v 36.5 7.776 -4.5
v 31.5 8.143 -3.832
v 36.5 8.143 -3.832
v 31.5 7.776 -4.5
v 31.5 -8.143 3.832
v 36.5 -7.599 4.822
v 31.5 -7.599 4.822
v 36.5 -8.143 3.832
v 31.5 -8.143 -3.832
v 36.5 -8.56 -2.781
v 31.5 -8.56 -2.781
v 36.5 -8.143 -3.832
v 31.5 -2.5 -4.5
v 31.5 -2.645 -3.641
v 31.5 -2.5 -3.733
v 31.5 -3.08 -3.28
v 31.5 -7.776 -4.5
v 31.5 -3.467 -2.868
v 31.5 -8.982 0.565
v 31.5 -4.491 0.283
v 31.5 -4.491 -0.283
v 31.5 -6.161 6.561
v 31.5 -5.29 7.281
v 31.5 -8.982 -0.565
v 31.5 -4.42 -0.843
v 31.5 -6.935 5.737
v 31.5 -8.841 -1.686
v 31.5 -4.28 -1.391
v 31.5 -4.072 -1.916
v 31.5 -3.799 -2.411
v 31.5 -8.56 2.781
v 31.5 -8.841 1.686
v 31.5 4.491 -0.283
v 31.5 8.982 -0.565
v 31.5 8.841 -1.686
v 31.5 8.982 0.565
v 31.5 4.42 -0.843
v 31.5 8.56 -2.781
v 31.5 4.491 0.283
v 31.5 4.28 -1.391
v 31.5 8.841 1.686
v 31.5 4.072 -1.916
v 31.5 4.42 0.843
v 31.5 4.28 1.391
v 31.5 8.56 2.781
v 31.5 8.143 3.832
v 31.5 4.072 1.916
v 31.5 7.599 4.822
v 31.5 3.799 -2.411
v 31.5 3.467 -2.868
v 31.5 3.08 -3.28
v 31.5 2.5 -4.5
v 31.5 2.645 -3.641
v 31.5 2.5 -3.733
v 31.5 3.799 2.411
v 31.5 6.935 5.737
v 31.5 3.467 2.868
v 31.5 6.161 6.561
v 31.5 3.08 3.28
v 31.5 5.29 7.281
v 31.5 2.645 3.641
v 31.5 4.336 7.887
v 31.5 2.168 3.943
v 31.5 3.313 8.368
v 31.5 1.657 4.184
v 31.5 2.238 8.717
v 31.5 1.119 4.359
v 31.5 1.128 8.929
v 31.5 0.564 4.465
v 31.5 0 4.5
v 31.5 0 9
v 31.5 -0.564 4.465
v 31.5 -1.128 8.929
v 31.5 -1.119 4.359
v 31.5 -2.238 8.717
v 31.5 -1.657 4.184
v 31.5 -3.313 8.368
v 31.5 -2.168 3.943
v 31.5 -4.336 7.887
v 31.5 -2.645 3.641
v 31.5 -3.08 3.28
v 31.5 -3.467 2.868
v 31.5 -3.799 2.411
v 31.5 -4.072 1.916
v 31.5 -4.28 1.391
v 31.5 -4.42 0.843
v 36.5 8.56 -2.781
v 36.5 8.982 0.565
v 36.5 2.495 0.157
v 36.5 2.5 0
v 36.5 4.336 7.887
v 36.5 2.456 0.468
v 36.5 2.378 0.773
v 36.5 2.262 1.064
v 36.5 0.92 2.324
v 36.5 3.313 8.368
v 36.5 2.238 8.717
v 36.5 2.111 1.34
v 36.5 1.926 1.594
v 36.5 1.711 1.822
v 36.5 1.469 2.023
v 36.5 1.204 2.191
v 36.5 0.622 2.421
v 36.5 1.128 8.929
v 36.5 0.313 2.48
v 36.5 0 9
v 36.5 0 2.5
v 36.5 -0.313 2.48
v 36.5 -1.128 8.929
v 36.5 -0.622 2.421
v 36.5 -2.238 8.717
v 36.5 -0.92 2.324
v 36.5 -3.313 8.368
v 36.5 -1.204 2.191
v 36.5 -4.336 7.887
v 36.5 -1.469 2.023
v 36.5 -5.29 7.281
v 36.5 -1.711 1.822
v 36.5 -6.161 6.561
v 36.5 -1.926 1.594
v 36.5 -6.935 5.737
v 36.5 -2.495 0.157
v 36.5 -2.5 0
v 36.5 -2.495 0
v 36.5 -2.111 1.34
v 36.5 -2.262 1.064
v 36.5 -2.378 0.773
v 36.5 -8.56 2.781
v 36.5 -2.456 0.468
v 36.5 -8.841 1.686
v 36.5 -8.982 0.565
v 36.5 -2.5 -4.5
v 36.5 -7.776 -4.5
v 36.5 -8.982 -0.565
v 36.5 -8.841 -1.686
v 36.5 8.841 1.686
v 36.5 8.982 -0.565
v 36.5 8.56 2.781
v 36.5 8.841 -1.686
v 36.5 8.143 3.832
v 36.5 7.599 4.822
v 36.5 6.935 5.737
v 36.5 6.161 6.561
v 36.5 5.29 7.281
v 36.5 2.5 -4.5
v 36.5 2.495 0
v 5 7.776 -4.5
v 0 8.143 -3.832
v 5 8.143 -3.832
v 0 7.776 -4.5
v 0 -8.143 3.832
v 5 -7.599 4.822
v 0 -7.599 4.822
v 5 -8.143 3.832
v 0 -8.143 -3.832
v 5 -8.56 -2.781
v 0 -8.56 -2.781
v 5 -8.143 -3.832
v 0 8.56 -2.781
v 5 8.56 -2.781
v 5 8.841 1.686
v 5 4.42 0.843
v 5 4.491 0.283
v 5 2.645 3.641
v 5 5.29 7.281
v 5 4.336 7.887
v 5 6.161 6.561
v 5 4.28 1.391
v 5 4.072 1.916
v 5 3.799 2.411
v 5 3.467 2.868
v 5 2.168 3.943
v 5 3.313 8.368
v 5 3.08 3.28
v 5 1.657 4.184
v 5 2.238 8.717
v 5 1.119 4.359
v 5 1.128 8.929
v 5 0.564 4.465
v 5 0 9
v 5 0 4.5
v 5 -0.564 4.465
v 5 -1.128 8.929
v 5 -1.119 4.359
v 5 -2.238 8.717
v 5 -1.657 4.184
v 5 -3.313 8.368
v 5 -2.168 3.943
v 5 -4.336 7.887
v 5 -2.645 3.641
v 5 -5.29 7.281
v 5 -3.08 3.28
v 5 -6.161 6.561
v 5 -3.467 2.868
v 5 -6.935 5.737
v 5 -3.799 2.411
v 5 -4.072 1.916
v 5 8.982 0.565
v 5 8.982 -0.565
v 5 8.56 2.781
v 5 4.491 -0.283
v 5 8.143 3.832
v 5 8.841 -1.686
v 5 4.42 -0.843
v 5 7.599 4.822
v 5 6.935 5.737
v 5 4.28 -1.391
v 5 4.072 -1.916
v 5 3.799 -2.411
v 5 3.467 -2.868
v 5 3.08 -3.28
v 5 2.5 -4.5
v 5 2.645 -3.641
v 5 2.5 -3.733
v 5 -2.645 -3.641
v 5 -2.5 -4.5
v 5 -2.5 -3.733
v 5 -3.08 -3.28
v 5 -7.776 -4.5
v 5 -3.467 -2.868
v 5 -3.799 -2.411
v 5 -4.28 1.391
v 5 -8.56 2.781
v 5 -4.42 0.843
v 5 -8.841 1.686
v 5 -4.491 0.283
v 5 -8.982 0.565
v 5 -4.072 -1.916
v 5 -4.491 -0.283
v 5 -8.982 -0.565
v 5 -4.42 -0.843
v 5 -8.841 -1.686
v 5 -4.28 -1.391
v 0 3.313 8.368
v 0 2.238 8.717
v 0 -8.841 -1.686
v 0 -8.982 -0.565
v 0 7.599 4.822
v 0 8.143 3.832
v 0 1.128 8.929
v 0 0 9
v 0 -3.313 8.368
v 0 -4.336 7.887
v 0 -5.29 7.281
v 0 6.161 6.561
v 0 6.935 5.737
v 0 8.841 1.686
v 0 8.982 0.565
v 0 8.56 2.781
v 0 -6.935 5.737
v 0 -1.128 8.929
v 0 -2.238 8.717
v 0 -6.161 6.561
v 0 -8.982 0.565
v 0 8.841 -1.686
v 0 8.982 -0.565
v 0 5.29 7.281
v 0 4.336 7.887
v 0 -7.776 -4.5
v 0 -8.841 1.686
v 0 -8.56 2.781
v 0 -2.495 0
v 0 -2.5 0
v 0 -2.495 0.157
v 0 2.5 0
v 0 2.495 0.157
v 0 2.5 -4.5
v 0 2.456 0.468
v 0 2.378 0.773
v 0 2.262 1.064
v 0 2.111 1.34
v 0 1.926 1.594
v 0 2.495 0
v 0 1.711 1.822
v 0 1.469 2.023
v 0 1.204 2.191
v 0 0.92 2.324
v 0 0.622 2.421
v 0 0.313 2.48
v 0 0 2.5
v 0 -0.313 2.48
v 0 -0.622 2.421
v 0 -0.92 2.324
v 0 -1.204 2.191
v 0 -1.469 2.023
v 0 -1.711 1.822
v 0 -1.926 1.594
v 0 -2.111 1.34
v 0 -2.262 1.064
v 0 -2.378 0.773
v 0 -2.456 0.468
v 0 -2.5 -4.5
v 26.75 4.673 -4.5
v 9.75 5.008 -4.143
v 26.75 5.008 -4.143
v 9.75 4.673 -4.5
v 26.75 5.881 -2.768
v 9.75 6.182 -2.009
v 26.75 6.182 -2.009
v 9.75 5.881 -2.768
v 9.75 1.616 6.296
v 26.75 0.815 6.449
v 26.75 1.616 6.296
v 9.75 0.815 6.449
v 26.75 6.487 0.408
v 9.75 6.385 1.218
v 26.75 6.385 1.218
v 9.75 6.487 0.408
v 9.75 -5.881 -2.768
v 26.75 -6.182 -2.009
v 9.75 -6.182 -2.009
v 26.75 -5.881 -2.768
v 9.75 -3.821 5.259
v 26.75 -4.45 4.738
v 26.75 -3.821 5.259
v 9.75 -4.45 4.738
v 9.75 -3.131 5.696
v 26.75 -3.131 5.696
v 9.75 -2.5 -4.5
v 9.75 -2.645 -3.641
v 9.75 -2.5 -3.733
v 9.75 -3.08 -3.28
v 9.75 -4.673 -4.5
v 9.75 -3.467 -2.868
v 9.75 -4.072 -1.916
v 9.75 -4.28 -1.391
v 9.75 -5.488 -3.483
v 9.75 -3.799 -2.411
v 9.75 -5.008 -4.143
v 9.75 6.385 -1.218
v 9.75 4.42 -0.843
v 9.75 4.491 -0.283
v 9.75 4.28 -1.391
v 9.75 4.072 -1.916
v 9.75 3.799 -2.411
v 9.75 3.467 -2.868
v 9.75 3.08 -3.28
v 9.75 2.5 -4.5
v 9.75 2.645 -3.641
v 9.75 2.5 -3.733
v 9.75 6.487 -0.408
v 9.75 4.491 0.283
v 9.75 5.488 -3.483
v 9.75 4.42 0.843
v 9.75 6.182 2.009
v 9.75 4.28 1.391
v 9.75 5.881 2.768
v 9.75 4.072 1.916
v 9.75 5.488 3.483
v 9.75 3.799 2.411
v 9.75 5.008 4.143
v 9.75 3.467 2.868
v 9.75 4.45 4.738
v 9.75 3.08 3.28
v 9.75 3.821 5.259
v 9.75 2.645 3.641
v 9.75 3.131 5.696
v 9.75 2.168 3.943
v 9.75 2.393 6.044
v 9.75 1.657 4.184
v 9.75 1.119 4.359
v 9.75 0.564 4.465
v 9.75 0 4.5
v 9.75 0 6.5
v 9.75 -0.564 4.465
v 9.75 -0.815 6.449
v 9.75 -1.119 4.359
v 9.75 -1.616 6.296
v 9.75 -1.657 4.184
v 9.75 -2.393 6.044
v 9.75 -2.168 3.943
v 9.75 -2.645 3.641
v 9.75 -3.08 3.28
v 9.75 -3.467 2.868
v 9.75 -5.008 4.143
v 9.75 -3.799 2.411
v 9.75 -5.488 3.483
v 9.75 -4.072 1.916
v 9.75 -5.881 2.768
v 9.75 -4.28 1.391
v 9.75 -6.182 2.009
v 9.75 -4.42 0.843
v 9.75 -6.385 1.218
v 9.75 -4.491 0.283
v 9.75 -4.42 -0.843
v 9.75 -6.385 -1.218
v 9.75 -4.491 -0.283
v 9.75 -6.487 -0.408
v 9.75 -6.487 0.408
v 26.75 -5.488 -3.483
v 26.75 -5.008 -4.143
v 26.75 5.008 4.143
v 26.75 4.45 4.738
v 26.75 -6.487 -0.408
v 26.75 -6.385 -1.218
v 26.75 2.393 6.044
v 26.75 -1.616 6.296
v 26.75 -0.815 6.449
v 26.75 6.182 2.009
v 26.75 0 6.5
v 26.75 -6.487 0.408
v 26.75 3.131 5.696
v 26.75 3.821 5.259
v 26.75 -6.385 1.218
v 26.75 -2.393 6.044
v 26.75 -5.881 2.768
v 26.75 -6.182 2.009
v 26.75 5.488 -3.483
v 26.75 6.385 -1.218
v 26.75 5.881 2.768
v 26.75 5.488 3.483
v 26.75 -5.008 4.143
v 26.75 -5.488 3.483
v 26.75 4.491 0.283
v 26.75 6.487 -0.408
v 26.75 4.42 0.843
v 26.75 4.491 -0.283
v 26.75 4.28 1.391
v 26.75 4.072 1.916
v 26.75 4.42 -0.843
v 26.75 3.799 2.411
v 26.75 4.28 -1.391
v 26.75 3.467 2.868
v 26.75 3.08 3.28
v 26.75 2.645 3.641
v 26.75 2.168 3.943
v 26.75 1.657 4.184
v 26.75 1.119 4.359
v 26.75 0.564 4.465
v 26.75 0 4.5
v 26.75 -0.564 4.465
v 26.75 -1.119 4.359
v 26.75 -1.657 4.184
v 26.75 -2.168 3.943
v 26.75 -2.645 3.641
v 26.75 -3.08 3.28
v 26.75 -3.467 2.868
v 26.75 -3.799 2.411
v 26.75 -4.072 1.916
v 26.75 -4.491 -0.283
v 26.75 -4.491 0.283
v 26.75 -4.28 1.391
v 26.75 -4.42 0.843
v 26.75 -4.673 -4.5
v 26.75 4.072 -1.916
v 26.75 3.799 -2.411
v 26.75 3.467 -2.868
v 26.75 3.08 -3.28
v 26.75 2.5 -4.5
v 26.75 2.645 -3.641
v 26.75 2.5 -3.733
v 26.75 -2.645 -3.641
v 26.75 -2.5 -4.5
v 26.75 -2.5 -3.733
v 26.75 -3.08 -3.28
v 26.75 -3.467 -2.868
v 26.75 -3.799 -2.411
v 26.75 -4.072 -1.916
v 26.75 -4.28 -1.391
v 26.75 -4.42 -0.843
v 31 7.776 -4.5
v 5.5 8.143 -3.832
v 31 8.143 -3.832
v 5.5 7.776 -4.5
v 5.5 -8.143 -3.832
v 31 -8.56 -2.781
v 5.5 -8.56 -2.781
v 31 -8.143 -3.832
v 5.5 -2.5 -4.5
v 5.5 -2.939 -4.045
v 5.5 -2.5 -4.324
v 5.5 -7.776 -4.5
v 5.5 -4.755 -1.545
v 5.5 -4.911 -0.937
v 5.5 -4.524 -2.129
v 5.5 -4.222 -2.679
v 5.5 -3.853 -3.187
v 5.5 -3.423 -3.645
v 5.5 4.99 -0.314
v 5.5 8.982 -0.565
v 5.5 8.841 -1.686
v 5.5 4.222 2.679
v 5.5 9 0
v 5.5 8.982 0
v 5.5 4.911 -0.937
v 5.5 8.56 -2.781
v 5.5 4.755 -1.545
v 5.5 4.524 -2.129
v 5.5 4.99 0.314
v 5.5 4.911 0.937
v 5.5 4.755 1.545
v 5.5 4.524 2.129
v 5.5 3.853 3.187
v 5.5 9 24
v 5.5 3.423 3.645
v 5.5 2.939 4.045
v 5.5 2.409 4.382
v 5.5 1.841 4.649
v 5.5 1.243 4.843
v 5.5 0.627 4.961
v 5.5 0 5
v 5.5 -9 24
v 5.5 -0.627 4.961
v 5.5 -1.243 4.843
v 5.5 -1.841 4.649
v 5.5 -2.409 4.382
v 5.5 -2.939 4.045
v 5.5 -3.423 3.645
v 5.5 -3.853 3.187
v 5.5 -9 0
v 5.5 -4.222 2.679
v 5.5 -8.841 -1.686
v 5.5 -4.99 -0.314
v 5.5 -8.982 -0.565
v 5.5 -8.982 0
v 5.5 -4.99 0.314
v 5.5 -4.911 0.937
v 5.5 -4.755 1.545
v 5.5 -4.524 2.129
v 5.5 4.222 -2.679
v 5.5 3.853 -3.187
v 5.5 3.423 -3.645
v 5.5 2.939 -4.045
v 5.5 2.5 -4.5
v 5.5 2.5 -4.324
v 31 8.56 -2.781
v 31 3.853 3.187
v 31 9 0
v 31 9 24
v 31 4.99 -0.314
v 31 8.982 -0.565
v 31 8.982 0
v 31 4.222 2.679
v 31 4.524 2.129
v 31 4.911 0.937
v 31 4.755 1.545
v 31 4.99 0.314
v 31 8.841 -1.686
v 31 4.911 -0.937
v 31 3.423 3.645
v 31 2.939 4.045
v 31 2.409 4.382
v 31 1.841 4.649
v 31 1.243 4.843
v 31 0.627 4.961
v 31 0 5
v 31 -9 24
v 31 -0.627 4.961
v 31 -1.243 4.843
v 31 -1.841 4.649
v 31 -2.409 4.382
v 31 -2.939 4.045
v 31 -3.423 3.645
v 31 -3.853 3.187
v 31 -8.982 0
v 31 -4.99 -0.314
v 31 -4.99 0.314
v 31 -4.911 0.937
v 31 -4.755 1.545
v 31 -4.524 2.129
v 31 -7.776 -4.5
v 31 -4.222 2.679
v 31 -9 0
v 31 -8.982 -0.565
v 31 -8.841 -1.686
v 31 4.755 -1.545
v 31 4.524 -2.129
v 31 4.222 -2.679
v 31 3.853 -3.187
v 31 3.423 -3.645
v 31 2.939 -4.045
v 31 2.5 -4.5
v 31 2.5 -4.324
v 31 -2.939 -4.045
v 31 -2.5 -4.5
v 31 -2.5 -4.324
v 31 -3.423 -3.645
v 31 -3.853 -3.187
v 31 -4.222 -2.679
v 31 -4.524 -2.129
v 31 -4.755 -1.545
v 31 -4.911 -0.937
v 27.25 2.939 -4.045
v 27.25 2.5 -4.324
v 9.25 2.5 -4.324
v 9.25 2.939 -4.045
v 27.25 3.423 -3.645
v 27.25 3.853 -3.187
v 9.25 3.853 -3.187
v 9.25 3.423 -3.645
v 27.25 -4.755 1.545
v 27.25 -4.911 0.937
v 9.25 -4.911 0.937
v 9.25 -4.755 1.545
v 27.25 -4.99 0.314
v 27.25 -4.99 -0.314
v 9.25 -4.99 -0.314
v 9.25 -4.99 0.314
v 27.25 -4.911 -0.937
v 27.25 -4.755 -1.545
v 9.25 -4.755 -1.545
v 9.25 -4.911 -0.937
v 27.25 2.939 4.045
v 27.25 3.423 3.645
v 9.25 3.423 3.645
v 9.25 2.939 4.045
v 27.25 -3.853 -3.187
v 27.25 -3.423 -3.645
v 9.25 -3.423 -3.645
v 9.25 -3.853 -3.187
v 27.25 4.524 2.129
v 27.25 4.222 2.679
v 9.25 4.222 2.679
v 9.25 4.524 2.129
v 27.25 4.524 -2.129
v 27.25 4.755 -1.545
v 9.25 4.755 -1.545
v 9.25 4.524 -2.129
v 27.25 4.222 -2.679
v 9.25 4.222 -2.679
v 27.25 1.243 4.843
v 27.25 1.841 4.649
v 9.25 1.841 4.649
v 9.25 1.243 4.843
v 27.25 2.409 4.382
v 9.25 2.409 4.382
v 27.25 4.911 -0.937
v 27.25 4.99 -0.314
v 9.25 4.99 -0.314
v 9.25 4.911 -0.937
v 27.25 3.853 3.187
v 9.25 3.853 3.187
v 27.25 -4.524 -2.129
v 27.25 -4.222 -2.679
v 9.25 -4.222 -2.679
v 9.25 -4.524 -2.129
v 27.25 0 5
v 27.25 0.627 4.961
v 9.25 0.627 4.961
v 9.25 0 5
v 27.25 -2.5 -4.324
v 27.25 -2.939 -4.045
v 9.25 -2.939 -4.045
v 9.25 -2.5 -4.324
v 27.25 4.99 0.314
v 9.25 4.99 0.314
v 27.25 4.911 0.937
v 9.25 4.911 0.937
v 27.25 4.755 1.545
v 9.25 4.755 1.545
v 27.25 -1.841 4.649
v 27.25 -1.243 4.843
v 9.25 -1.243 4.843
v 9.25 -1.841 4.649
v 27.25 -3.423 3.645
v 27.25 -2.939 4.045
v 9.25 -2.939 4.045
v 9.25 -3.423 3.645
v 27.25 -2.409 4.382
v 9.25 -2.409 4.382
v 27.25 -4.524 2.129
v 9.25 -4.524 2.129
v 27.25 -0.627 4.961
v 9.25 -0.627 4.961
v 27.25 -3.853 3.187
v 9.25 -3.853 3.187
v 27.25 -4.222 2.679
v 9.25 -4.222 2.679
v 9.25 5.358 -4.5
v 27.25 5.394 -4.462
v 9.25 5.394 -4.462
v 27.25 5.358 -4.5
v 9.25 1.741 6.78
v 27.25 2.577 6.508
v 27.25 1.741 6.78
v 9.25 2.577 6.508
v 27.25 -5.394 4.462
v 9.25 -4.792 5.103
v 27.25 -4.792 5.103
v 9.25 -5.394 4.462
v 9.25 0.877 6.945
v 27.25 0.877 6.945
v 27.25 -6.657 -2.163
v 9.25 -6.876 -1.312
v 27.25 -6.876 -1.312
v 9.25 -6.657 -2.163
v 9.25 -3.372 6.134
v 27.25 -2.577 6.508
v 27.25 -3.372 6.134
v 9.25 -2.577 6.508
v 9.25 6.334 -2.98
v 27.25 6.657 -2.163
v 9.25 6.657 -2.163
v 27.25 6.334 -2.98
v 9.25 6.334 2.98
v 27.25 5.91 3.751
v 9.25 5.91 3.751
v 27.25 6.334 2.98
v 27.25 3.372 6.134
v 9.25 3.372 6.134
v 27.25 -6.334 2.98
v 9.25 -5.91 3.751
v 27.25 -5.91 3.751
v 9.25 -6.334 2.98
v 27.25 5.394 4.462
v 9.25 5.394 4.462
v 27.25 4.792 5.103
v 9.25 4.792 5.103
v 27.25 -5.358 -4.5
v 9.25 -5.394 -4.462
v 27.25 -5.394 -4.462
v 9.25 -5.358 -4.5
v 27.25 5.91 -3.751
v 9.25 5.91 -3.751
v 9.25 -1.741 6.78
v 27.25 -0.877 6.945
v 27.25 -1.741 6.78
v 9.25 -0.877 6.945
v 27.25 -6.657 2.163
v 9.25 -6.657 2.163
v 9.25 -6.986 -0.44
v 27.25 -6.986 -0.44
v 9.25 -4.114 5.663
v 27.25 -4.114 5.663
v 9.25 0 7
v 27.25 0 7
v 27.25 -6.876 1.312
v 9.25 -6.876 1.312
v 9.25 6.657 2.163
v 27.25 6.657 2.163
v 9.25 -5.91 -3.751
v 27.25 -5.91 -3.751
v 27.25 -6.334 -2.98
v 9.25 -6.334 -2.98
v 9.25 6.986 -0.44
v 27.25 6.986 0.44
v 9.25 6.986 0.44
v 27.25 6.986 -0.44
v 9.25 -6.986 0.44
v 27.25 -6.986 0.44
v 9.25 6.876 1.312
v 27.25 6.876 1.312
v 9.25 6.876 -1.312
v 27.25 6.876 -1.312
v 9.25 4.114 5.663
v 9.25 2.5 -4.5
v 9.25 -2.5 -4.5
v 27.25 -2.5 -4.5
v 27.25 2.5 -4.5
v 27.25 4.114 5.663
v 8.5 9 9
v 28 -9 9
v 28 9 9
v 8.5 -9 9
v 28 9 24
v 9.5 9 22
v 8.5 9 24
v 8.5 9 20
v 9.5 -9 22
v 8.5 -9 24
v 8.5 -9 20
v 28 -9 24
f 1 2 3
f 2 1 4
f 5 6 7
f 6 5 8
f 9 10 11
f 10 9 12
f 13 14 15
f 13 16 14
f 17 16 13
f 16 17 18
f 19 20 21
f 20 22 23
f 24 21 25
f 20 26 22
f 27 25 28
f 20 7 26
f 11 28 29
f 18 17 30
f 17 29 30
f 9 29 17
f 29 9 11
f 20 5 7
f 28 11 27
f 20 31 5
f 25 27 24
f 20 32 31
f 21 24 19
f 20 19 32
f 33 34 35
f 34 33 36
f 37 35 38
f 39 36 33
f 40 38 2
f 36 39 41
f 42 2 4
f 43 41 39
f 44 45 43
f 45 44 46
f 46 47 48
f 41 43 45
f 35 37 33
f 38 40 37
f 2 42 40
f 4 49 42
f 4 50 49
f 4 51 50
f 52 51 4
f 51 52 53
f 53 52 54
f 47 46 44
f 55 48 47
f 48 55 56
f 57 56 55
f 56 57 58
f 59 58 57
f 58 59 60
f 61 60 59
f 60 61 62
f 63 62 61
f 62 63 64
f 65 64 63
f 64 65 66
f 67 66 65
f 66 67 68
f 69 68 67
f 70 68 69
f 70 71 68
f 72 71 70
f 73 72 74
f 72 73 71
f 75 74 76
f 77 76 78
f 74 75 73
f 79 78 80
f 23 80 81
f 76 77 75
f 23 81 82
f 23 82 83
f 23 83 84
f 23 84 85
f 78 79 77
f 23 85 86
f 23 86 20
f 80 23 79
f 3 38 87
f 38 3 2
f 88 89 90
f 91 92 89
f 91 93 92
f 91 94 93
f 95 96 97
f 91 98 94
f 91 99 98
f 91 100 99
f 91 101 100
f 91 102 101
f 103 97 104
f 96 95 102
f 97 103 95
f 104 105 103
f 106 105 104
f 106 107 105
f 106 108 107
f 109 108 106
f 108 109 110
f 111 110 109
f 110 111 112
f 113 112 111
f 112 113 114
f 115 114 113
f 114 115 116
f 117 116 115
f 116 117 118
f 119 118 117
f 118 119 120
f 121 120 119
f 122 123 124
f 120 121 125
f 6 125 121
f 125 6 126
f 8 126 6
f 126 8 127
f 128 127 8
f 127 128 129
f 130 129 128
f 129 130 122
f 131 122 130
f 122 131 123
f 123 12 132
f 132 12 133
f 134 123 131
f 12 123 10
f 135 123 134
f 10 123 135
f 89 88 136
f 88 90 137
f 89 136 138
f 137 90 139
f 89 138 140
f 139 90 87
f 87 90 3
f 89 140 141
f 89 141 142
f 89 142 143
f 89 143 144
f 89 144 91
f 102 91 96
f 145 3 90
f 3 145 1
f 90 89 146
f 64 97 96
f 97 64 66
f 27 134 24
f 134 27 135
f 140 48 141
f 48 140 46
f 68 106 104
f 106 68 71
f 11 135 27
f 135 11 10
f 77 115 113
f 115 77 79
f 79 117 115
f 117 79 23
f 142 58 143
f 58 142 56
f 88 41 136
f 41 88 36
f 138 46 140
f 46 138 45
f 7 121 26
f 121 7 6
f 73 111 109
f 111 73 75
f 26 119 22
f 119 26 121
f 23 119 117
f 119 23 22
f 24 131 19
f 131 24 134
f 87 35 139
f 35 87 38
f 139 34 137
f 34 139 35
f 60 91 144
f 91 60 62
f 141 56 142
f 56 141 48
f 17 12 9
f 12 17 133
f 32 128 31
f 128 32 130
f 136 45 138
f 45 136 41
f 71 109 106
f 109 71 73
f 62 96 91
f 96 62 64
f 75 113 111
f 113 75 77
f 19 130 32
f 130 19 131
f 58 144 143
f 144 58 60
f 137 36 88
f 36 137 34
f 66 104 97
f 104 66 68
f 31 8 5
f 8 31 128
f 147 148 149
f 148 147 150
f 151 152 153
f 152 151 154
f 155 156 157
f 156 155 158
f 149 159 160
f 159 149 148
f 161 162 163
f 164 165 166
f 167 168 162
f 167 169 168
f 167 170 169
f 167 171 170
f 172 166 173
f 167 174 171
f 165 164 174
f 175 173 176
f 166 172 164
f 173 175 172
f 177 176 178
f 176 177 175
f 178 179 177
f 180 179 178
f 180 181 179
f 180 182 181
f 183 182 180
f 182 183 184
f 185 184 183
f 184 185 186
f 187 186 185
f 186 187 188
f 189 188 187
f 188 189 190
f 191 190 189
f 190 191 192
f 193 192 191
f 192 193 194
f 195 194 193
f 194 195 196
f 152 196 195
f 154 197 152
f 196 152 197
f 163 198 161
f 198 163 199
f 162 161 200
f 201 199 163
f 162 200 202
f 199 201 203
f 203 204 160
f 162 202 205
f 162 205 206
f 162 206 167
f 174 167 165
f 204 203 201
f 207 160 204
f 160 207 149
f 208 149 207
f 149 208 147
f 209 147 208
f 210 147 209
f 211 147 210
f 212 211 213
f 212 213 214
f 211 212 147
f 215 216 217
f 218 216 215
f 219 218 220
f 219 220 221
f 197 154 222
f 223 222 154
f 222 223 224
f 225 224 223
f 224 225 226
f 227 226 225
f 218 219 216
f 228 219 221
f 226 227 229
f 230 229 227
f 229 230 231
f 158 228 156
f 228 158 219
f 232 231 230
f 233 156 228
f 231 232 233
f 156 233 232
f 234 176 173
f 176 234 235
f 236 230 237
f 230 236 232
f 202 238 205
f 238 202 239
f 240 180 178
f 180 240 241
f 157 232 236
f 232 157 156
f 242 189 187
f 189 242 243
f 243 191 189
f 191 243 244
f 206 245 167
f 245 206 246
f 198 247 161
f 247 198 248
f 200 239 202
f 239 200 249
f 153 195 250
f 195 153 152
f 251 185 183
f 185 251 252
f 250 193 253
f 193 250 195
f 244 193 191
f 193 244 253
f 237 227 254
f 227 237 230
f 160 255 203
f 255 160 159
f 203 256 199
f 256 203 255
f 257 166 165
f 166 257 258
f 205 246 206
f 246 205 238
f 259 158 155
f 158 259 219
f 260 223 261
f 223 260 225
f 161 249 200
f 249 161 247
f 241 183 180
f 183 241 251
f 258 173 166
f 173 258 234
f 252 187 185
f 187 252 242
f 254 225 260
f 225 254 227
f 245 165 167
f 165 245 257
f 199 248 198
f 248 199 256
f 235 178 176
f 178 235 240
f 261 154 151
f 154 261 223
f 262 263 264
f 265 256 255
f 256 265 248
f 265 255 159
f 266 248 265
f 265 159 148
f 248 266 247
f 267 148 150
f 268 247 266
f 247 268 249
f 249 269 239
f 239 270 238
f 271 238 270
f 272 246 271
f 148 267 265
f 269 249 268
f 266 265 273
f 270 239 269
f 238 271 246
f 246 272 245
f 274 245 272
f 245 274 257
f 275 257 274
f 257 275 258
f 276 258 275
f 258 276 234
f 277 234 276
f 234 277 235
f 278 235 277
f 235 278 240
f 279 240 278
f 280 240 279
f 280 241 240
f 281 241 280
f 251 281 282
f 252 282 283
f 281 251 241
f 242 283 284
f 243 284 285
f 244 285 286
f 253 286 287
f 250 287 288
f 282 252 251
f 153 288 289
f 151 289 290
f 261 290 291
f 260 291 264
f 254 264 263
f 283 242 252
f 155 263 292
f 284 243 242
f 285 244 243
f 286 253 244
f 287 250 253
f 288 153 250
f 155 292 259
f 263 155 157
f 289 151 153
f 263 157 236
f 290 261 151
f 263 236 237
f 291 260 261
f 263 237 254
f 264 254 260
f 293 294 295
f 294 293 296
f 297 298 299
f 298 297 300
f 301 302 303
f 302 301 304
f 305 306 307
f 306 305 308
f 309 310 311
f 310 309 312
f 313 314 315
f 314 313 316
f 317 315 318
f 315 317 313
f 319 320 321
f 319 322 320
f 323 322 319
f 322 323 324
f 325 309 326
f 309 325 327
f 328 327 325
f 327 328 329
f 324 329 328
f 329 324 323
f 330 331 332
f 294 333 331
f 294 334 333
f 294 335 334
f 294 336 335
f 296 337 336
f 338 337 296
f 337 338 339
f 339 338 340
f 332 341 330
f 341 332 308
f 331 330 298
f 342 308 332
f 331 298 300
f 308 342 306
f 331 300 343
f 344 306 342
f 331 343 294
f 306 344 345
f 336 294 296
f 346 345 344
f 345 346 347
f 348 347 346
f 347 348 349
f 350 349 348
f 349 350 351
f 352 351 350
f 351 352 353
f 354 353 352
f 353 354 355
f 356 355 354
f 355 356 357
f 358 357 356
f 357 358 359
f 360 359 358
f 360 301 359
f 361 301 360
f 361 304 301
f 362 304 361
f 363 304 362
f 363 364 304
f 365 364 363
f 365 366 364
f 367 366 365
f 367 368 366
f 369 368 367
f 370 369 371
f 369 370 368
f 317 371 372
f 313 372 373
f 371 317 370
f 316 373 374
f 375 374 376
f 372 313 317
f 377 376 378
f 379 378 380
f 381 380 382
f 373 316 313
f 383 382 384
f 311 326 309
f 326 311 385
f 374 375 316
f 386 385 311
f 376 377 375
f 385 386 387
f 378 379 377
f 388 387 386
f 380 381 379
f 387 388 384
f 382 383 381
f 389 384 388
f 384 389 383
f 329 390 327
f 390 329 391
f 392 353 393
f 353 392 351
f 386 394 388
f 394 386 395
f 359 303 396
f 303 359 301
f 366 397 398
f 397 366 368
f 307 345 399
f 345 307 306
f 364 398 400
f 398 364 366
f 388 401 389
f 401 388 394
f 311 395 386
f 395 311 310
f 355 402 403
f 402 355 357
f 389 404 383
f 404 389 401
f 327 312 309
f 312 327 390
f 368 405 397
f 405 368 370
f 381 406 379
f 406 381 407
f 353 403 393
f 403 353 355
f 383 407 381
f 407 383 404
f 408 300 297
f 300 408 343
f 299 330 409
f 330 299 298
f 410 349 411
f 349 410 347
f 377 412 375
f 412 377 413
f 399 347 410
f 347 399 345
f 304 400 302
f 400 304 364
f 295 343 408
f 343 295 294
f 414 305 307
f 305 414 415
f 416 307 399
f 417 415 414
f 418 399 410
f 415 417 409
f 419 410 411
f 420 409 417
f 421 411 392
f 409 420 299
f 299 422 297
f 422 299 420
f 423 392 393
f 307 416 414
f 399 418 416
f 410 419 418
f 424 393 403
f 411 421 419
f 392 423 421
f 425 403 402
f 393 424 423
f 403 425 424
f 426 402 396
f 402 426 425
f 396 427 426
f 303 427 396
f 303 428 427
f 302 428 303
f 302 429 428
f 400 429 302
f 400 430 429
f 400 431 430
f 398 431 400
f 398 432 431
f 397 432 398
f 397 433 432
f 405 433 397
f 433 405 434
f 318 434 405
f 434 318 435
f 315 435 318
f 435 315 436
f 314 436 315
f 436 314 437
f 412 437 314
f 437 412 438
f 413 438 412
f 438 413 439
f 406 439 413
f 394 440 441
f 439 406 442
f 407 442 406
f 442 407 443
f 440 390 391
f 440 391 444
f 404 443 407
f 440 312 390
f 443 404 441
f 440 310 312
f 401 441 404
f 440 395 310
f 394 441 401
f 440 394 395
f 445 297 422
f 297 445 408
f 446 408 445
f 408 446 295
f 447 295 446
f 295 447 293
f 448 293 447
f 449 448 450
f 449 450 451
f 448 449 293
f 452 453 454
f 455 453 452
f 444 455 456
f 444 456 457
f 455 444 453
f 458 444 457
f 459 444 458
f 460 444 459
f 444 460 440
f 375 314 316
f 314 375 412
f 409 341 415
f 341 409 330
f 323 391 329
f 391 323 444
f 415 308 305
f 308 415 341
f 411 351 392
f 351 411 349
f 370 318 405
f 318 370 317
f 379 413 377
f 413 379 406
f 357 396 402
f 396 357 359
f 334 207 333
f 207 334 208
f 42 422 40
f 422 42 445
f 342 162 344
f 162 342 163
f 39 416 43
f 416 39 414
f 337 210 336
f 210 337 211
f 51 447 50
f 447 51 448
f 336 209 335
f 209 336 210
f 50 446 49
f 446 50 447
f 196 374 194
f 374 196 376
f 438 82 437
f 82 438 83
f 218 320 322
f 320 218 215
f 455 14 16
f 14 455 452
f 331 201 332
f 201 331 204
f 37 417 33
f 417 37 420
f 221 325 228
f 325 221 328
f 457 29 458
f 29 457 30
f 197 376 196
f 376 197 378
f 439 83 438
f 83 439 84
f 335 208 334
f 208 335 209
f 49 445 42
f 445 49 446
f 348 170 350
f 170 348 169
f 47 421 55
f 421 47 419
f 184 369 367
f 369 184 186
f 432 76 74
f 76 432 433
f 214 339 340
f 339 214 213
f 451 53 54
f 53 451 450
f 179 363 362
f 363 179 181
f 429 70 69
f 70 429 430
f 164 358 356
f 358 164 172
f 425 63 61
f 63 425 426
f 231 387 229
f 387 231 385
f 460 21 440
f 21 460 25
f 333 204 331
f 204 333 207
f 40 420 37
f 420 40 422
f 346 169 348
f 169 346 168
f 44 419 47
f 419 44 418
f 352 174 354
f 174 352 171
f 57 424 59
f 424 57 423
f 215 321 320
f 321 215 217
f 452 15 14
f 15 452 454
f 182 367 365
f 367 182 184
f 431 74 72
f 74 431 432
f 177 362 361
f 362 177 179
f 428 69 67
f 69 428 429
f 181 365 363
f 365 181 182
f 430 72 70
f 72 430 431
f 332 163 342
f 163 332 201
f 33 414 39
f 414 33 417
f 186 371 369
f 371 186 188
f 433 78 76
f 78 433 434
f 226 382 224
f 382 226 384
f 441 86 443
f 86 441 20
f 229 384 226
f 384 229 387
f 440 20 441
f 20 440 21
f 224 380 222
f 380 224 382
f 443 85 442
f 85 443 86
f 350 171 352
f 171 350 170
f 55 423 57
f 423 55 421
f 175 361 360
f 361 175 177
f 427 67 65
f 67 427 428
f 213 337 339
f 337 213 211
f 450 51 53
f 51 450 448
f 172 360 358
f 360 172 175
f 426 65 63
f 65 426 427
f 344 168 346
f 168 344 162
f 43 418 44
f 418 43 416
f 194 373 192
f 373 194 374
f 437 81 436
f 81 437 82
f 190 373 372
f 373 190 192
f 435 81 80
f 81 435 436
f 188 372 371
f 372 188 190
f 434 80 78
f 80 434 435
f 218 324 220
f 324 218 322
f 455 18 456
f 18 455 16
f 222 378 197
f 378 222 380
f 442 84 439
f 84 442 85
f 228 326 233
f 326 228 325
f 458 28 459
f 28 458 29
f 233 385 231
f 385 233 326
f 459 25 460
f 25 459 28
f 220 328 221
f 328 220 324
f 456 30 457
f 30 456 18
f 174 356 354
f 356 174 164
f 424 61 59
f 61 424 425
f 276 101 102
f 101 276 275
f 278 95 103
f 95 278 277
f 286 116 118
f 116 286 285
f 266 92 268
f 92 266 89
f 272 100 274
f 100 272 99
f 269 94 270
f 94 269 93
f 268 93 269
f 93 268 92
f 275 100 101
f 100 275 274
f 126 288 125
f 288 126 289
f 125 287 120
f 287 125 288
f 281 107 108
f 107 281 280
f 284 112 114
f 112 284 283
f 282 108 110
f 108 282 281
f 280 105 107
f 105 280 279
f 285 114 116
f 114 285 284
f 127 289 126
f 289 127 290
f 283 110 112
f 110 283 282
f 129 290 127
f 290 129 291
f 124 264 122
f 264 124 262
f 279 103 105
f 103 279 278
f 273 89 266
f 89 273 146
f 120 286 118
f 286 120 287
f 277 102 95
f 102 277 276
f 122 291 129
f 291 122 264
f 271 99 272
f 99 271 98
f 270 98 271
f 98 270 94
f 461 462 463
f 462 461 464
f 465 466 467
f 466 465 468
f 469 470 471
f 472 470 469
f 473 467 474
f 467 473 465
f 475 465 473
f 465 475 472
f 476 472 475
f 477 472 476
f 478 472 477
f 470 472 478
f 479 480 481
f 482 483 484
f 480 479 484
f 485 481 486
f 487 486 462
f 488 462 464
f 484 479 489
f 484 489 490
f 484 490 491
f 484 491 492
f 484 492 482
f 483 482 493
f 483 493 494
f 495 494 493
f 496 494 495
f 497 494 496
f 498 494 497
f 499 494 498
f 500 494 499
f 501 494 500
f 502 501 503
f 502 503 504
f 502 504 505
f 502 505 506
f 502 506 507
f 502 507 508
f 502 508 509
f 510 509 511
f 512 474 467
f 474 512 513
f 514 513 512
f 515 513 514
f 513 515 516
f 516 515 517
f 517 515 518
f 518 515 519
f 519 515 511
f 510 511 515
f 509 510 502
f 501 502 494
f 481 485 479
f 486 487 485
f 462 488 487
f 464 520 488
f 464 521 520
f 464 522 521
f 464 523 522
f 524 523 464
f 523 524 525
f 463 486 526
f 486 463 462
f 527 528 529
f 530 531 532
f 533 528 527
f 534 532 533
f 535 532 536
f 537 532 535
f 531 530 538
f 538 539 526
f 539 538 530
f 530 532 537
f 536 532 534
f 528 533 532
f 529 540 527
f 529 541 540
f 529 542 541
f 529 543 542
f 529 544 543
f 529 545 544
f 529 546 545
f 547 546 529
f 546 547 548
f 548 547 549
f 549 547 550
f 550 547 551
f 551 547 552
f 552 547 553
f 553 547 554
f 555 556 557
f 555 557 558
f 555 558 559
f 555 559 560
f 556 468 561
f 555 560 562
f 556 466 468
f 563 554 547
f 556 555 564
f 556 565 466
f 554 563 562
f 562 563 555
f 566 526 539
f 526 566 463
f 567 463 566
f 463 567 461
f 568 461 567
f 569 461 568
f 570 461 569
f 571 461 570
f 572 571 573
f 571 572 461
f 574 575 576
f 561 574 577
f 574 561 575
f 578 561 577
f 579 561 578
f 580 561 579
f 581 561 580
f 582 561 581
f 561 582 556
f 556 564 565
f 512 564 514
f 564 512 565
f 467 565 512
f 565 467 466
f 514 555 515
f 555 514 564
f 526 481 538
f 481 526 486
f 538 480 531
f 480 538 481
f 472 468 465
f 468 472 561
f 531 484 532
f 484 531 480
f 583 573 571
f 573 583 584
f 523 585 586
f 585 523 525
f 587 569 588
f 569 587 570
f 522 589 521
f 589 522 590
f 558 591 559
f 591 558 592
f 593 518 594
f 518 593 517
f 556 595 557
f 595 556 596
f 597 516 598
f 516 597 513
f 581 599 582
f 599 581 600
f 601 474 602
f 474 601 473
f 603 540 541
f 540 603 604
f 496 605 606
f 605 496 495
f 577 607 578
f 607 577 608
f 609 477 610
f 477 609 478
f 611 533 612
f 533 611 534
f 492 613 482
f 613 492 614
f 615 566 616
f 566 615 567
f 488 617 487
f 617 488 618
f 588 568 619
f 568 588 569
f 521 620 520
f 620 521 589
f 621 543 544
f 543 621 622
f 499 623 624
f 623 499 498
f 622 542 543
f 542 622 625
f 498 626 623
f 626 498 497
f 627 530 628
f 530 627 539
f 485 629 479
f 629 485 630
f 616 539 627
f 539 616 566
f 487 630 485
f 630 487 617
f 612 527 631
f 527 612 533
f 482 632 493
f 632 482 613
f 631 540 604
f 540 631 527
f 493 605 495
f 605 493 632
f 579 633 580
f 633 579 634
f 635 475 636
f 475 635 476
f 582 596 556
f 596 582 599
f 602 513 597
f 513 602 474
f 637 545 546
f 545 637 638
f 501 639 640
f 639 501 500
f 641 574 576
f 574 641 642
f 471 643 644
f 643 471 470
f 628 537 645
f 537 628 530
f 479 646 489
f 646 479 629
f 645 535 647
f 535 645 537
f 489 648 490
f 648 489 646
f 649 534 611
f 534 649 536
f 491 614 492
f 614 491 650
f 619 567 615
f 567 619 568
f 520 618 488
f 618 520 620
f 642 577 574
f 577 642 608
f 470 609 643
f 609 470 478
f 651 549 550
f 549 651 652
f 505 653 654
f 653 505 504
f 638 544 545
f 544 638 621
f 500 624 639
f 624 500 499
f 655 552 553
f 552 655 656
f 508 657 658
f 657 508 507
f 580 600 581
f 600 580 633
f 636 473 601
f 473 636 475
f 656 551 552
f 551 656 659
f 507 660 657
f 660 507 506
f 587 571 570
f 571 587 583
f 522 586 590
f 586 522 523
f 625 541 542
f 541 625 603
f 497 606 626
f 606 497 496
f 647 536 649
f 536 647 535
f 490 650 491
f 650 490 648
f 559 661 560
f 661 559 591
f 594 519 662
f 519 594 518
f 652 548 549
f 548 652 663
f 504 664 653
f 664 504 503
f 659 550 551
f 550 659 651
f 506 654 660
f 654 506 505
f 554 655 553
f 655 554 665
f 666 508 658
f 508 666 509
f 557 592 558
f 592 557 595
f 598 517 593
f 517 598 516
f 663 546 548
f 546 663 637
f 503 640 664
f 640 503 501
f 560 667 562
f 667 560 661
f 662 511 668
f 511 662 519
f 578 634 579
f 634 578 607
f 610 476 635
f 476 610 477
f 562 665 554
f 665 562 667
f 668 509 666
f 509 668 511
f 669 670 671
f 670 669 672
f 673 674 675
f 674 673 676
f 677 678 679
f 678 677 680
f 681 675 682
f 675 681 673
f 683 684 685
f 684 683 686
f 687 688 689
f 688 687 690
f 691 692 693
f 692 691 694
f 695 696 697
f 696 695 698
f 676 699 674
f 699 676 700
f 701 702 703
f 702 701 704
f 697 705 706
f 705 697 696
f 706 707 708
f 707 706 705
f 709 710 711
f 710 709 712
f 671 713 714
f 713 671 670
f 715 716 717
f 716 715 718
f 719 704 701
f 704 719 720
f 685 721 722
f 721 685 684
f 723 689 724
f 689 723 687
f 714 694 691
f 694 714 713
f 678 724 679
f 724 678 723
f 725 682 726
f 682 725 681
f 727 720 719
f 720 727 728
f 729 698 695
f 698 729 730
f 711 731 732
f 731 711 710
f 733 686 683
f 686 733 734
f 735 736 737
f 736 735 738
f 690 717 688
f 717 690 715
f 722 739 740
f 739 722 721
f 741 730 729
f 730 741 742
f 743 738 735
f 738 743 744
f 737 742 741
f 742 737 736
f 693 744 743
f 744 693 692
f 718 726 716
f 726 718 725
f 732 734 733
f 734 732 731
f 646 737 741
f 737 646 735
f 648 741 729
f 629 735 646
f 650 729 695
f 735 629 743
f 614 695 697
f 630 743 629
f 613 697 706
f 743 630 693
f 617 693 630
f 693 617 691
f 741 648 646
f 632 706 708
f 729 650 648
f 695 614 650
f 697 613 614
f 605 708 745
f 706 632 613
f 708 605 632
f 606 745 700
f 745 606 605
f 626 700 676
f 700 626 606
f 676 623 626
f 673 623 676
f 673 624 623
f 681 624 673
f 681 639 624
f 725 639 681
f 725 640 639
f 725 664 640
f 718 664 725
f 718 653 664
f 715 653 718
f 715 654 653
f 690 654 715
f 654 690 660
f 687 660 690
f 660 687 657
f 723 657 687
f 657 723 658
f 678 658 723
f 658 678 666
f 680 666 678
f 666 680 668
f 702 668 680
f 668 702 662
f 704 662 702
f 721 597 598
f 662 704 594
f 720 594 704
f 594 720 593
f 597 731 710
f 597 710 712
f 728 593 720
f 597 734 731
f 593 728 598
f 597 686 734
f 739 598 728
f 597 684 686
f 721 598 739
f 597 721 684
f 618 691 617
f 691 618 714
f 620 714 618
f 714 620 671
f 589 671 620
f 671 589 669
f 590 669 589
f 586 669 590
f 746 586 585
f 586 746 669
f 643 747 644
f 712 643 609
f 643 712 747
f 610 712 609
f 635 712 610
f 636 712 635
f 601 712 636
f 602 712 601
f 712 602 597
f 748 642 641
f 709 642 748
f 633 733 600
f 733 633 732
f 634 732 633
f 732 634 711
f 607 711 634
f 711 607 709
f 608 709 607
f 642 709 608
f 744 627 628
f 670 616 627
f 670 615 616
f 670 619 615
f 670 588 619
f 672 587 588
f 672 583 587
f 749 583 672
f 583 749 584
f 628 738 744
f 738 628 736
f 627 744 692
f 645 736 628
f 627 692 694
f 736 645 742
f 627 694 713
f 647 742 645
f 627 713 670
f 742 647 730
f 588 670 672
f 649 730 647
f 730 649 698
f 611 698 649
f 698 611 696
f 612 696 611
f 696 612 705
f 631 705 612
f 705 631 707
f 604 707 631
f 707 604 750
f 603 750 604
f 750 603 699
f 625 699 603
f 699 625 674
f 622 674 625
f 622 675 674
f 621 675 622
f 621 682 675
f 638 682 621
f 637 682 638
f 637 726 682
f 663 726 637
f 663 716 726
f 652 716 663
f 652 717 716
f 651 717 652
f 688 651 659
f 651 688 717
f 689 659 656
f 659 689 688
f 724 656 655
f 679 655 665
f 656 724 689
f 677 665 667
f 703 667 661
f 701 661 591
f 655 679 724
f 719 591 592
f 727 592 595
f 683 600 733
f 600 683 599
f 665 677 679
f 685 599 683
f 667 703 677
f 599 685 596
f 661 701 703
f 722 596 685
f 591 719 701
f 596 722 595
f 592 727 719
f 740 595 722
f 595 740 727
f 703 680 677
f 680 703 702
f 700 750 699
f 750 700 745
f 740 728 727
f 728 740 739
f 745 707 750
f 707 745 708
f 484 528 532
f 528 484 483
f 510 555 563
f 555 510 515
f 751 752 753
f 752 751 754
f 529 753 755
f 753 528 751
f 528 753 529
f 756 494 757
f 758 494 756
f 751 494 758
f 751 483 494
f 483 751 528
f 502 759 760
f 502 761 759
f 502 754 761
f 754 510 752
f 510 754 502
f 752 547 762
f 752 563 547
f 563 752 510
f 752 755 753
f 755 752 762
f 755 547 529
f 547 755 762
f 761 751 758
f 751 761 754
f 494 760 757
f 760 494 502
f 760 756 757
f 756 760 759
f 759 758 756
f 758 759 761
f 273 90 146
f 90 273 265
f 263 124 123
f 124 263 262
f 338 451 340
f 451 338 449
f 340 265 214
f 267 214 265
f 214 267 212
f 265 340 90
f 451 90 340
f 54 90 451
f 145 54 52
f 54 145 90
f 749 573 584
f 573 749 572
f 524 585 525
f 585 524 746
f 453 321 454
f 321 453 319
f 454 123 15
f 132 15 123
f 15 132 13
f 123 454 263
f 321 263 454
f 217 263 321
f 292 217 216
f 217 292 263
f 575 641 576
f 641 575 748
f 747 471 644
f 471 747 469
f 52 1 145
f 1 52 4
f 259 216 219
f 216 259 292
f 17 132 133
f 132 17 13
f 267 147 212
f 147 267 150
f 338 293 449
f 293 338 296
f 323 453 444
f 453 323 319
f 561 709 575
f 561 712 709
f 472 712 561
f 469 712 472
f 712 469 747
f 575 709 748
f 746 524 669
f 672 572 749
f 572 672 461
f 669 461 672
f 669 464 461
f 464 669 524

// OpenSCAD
// [FL_INDEX: keywords="openscad, 3d_parametric, Captive_Customizeable_Cable_Holder, csg_solid" | COT="Parametric OpenSCAD design from 3DCodeverse"]
// Title: Captive Customizeable Cable Holder

/* [PrintOptions] */
// preview[view:south east, tilt:bottom diagonal]

// splits the cable holder into 2 parts for printing if your machine doesn't do well with printing tight tolerances
show_seperate = "no"; // [yes, no]

/* [Basic] */
// is the diameter of the cable in mm to be held by the cable holder
cable_diameter = 5;
// sets the distance between the holding tabs in mm
table_thickness = 19.5;
// controls the distance between moving parts of the cable holder
tolerance = 0.5;


/* [Table_tabs] */
// adjusts the length of the tabs in mm that will hold the cable holder on to the table
tab_length = 15;
// adjusts how thick the tabs that hold the cable holder to the table should be in mm
tab_thickness = 3;

/* [Table_grip] */
// adjusts the triangular grip protrusion height in mm
grip_height = 1;
// adjusts the base width of the triangular grip protrusion in mm
grip_width = 4;

/* [Thumbwheels] */
//controls how tall the end thumbwheels should be in mm
thumbwheel_height = 5;

/* [Advanced] */
// is confusing name, just play with it and see what it does
retainer_factor = 6; // [3, 4, 5, 6, 7, 8, 9, 10]
// is another one to play around with.  Choose values between 0 and 2
plane_cut_factor = 1;
// is the quality of the cylinders
$fn = 50;

/* [Advanced_neck] */
// is the thickness of the inner rotating cuff in mm
neck_thickness = 2;

/* [Advanced_holder] */
// controls the overall thickness of the outer holder in mm
holder_thickness = 4;

/* [Hidden] */
barrel_lift_factor = 1/retainer_factor;
barrel_thickness = holder_thickness/2;

holder_height = 2*tab_thickness + table_thickness;
holder_diameter = cable_diameter + 2*neck_thickness + 2*tolerance + 2*holder_thickness;
plane_cut_depth = plane_cut_factor*(cable_diameter/2 + neck_thickness);

preview_tab = "";

rotate([0,90,0]) difference()
{

	// main holder barrels and tabs
	union()
	{
		// inner barrel
		
		if(show_seperate == "no")
		{
			InnerBarrel();
		}
		else
		{
			translate([0, holder_diameter + 5, 0]) 
			difference()
			{
				InnerBarrel();
				// cable notch
				translate([0, -cable_diameter/2, -0.5]) cube([holder_diameter/2 + 0.5, cable_diameter, thumbwheel_height + tolerance + holder_height + tolerance + thumbwheel_height + 1]);
				// plane slice
				translate([plane_cut_depth, -(holder_diameter + 1)/2, -0.5]) cube([holder_diameter/2 + 0.5, holder_diameter + 1, thumbwheel_height + tolerance + holder_height + tolerance + thumbwheel_height + 1]);
			}
		}
		
		// outer holder barrel
		highlight("Advanced_holder") difference()
		{
			// main body of the holder
			translate([0,0, thumbwheel_height + tolerance]) cylinder(r = holder_diameter/2, h = holder_height);
			
			// tolerance for neck
			translate([0,0,thumbwheel_height + tolerance + -0.5]) cylinder(r = cable_diameter/2 + neck_thickness + tolerance, h = holder_height + 1);
			// tolerance for the barrel
			translate([0,0, thumbwheel_height + tolerance + barrel_lift_factor*holder_height-tolerance]) cylinder(r = cable_diameter/2 + neck_thickness + barrel_thickness + tolerance, h = holder_height*(1-2*barrel_lift_factor) + 2*tolerance);
		}
		
		// main body holder
		union()
		{
			// upper tab
			highlight("Table_tabs") translate([-tab_length - holder_diameter/2, -holder_diameter/2, thumbwheel_height + tolerance + holder_height - tab_thickness]) cube([tab_length + 0.1, holder_diameter, tab_thickness]);
			// lower tab
			highlight("Table_tabs")translate([-tab_length - holder_diameter/2, -holder_diameter/2, thumbwheel_height + tolerance]) cube([tab_length + 0.1, holder_diameter, tab_thickness]);
			// lower grip
			highlight("Table_grip") translate([-tab_length - holder_diameter/2, holder_diameter/2,  thumbwheel_height + tolerance + tab_thickness]) rotate([90, 0, 0]) linear_extrude(height = holder_diameter, convexity = 10) polygon(points = [[0,0], [grip_width/2,grip_height], [grip_width,0], [grip_width,-0.1], [0,-0.1]]);
			
			// body block to  cylinder
			highlight("Advanced_holder") difference()
			{
				// main body block
				translate([-holder_diameter/2, -holder_diameter/2, thumbwheel_height + tolerance]) cube([holder_diameter/2, holder_diameter, holder_height]);
				// cylinder cut
				translate([0,0, thumbwheel_height + tolerance - 0.1]) cylinder(r = holder_diameter/2, h = holder_height + 1);
			}
		}
	}

	// cable notch
	translate([0, -cable_diameter/2, -0.5]) cube([holder_diameter/2 + 0.5, cable_diameter, thumbwheel_height + tolerance + holder_height + tolerance + thumbwheel_height + 1]);
	// plane slice
	translate([plane_cut_depth, -(holder_diameter + 1)/2, -0.5]) cube([holder_diameter/2 + 0.5, holder_diameter + 1, thumbwheel_height + tolerance + holder_height + tolerance + thumbwheel_height + 1]);
}

module InnerBarrel()
{
	difference()
		{
			union()
			{
				// top thumbwheel
				highlight("Thumbwheels") translate([0,0, thumbwheel_height + tolerance + holder_height+tolerance]) cylinder(r = holder_diameter/2, h = thumbwheel_height);
				// bottom thumbwheel
				highlight("Thumbwheels") cylinder(r = holder_diameter/2, h = thumbwheel_height);
				// retaining barrel
				translate([0,0, thumbwheel_height + tolerance + barrel_lift_factor*holder_height]) cylinder(r = cable_diameter/2 + neck_thickness + barrel_thickness, h = holder_height*(1-2*barrel_lift_factor));
				// the main barrel, or the "neck"
				highlight("Advanced_neck") cylinder(r = cable_diameter/2 + neck_thickness, h =thumbwheel_height + tolerance +  holder_height + tolerance + thumbwheel_height);
			}

			// The hole for the cable to go through
			translate([0,0,-.5]) cylinder(r = cable_diameter/2, h = thumbwheel_height + tolerance + holder_height + tolerance + thumbwheel_height + 1);
		}
}

module highlight(this_tab)
{
	if(preview_tab == this_tab)
	{
		color("red") child(0);
	}
	else
	{	
		child(0);
	}
}
